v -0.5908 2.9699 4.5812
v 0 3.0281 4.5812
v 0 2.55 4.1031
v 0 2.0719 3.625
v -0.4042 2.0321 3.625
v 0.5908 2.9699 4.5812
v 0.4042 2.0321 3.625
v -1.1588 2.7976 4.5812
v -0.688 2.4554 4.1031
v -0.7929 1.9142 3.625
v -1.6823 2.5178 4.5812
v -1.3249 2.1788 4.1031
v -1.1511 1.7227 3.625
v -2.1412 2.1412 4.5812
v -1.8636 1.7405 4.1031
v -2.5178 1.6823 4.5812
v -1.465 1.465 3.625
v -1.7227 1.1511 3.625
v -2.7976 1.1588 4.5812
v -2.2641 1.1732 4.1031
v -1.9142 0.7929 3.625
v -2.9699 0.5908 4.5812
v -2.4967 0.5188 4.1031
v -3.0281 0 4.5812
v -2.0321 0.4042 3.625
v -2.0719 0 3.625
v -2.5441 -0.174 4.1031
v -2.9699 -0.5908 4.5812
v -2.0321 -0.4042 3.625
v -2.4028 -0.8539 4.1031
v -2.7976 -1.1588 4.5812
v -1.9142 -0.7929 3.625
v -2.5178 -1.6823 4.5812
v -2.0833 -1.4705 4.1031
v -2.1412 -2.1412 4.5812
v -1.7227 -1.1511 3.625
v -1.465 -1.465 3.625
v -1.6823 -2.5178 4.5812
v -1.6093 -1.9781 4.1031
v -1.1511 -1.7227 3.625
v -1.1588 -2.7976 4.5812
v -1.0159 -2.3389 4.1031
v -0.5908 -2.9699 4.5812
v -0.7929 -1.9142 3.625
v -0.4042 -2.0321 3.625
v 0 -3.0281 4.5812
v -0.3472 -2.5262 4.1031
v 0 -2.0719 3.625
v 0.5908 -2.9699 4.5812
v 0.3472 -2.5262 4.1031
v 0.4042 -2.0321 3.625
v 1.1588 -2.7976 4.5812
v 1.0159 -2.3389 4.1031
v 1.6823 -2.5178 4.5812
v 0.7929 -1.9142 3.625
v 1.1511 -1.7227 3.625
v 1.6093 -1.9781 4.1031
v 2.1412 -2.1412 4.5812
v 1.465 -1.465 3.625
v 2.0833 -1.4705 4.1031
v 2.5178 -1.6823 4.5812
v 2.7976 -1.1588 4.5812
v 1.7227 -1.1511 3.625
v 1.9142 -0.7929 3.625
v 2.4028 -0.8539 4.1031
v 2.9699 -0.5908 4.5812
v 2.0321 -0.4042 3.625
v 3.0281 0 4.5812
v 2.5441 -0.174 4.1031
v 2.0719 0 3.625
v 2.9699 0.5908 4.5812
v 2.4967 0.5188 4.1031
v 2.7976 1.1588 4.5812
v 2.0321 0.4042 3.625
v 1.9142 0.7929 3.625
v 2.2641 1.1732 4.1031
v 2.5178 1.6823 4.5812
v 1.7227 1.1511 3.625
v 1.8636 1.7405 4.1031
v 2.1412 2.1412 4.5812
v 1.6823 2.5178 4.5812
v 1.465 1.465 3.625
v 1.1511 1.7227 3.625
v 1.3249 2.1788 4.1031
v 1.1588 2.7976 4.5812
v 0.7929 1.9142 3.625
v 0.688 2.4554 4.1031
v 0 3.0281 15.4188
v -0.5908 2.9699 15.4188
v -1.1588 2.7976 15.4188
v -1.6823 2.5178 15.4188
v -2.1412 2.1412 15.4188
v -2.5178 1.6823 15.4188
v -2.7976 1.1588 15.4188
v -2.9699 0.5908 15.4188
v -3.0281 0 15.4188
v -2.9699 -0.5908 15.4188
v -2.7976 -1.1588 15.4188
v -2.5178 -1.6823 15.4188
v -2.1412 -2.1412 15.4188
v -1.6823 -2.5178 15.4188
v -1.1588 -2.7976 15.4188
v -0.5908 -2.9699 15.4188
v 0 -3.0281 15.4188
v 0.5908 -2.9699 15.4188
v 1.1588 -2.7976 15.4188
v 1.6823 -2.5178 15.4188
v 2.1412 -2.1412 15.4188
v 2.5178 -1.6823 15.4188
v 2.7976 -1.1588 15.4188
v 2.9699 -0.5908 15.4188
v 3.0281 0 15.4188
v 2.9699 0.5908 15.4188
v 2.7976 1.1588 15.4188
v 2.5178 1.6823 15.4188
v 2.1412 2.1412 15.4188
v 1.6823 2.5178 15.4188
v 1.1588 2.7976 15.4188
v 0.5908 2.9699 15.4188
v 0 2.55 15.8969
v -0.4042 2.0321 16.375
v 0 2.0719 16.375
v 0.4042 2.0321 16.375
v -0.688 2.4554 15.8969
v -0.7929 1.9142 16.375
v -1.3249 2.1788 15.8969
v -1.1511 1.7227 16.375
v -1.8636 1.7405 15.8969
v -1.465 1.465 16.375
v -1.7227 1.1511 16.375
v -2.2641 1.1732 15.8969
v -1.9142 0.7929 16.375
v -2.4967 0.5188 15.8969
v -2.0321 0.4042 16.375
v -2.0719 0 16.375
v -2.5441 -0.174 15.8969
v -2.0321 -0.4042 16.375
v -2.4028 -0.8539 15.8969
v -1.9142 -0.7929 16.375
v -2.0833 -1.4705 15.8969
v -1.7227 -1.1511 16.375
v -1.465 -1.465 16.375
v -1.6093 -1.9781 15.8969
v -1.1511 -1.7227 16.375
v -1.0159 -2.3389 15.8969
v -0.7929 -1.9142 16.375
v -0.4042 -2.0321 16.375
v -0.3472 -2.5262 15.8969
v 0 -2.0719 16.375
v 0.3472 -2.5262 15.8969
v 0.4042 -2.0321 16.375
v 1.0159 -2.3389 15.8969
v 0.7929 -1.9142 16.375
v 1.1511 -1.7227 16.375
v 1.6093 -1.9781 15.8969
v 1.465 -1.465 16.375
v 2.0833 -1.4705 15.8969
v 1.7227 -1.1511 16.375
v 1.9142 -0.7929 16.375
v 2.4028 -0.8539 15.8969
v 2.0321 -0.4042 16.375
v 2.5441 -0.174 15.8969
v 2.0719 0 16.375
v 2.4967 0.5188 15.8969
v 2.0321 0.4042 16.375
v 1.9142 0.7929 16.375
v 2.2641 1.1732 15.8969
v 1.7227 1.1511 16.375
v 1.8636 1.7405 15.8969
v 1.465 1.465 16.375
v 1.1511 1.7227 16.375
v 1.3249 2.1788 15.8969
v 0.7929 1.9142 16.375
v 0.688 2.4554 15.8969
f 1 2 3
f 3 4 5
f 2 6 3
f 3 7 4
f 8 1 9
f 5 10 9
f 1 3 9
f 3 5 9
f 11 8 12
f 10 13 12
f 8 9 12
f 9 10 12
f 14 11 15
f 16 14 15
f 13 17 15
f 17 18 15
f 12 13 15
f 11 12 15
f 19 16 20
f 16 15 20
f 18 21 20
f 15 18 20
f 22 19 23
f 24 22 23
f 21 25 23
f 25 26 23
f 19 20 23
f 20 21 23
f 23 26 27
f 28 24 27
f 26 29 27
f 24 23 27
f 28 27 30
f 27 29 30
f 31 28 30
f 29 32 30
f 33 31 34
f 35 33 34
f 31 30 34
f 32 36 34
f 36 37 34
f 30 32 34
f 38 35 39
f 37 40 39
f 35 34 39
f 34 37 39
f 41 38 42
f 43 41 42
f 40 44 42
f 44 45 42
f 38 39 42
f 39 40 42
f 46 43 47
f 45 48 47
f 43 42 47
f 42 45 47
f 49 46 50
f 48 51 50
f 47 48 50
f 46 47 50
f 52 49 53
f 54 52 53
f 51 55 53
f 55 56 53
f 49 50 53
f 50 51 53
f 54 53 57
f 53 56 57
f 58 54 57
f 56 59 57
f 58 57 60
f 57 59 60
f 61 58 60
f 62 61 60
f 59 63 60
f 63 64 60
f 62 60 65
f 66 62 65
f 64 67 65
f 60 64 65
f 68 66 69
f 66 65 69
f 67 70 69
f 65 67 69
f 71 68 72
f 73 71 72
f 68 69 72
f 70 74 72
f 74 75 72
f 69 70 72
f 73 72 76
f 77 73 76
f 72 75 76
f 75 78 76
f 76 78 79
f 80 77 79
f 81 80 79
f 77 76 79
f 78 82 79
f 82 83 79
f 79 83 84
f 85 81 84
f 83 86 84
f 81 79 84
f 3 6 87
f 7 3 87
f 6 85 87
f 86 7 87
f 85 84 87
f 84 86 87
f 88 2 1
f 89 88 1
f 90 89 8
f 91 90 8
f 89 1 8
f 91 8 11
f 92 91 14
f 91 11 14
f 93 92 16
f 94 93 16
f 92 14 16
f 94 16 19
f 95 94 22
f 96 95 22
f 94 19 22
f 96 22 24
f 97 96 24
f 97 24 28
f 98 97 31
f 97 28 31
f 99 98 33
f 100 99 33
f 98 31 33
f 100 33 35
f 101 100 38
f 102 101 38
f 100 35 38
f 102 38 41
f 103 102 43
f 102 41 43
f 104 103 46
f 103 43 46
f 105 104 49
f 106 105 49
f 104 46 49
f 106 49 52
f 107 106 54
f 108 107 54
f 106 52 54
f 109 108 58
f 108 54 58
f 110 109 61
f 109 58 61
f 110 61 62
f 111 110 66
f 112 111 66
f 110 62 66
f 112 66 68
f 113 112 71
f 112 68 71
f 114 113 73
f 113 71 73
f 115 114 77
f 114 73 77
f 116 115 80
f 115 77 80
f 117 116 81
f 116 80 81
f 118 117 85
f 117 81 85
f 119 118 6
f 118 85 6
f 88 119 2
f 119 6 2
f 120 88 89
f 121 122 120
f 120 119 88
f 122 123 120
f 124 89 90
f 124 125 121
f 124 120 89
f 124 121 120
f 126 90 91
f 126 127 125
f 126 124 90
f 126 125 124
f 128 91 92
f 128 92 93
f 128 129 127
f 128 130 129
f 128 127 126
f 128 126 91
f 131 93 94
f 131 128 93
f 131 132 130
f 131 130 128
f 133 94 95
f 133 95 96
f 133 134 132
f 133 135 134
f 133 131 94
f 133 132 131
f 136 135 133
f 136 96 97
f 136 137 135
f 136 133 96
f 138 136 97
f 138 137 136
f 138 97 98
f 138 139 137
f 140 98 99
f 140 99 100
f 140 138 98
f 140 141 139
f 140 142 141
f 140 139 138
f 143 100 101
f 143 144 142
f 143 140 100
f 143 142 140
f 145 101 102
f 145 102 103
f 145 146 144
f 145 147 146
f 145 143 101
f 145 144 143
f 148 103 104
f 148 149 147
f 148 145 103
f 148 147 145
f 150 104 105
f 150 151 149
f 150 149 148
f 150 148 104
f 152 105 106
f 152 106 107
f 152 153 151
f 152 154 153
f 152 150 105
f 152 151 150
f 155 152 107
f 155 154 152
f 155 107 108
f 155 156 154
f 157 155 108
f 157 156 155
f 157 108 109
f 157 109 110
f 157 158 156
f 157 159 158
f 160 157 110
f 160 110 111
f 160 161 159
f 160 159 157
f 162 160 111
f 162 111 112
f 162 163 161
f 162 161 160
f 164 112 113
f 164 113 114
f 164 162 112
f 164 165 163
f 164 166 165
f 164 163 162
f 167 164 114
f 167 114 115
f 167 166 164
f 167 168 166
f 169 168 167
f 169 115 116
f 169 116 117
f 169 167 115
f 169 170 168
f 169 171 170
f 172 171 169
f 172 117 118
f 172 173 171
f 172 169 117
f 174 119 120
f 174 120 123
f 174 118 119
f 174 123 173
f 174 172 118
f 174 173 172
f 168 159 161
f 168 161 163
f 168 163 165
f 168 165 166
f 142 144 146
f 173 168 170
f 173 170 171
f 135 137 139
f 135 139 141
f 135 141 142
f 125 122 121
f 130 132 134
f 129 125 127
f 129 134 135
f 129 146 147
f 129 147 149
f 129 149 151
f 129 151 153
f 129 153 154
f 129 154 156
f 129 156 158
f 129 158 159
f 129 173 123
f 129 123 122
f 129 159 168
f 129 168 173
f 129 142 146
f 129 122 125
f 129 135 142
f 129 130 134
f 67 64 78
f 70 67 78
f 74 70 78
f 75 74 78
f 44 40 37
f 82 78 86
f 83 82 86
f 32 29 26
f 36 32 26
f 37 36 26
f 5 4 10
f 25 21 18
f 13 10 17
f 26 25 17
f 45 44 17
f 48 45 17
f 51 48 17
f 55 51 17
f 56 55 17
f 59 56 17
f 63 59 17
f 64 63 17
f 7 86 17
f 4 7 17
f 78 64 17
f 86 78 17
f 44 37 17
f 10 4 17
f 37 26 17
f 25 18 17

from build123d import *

# Parameters (mm, degrees)
SKETCH1_R           = 4.75
BOSS_EXTRUDE1_DEPTH = 20
CHAMFER1_SIZE       = 1.5
CHAMFER2_SIZE       = 1.5
SCALE1_SCALE        = 0.75
SCALE2_SCALE        = 0.85


with BuildPart() as part:
    # Sketch1 → Boss-Extrude1 (new body)
    with BuildSketch(Plane(origin=(0, 0, 0), x_dir=(0, 1, 0), z_dir=(0, 0, 1))):
        Circle(SKETCH1_R)
    extrude(amount=BOSS_EXTRUDE1_DEPTH)

    # Chamfer1
    chamfer1_edges = [part.edges().sort_by_distance(p)[0] for p in [
        (0, -4.75, 0),
    ]]
    chamfer(chamfer1_edges, length=CHAMFER1_SIZE)

    # Chamfer2
    chamfer2_edges = [part.edges().sort_by_distance(p)[0] for p in [
        (0, -4.75, 20),
    ]]
    chamfer(chamfer2_edges, length=CHAMFER2_SIZE)


with BuildPart() as part_1:
    # Scale1: scaled about (0, 0, 10)
    add(part.part.scale(SCALE1_SCALE).moved(Location((0, 0, 2.5))))


with BuildPart() as part_2:
    # Scale2: scaled about (0, 0, 10)
    add(part_1.part.scale(SCALE2_SCALE).moved(Location((0, 0, 1.5))))


solid = part_2.part
